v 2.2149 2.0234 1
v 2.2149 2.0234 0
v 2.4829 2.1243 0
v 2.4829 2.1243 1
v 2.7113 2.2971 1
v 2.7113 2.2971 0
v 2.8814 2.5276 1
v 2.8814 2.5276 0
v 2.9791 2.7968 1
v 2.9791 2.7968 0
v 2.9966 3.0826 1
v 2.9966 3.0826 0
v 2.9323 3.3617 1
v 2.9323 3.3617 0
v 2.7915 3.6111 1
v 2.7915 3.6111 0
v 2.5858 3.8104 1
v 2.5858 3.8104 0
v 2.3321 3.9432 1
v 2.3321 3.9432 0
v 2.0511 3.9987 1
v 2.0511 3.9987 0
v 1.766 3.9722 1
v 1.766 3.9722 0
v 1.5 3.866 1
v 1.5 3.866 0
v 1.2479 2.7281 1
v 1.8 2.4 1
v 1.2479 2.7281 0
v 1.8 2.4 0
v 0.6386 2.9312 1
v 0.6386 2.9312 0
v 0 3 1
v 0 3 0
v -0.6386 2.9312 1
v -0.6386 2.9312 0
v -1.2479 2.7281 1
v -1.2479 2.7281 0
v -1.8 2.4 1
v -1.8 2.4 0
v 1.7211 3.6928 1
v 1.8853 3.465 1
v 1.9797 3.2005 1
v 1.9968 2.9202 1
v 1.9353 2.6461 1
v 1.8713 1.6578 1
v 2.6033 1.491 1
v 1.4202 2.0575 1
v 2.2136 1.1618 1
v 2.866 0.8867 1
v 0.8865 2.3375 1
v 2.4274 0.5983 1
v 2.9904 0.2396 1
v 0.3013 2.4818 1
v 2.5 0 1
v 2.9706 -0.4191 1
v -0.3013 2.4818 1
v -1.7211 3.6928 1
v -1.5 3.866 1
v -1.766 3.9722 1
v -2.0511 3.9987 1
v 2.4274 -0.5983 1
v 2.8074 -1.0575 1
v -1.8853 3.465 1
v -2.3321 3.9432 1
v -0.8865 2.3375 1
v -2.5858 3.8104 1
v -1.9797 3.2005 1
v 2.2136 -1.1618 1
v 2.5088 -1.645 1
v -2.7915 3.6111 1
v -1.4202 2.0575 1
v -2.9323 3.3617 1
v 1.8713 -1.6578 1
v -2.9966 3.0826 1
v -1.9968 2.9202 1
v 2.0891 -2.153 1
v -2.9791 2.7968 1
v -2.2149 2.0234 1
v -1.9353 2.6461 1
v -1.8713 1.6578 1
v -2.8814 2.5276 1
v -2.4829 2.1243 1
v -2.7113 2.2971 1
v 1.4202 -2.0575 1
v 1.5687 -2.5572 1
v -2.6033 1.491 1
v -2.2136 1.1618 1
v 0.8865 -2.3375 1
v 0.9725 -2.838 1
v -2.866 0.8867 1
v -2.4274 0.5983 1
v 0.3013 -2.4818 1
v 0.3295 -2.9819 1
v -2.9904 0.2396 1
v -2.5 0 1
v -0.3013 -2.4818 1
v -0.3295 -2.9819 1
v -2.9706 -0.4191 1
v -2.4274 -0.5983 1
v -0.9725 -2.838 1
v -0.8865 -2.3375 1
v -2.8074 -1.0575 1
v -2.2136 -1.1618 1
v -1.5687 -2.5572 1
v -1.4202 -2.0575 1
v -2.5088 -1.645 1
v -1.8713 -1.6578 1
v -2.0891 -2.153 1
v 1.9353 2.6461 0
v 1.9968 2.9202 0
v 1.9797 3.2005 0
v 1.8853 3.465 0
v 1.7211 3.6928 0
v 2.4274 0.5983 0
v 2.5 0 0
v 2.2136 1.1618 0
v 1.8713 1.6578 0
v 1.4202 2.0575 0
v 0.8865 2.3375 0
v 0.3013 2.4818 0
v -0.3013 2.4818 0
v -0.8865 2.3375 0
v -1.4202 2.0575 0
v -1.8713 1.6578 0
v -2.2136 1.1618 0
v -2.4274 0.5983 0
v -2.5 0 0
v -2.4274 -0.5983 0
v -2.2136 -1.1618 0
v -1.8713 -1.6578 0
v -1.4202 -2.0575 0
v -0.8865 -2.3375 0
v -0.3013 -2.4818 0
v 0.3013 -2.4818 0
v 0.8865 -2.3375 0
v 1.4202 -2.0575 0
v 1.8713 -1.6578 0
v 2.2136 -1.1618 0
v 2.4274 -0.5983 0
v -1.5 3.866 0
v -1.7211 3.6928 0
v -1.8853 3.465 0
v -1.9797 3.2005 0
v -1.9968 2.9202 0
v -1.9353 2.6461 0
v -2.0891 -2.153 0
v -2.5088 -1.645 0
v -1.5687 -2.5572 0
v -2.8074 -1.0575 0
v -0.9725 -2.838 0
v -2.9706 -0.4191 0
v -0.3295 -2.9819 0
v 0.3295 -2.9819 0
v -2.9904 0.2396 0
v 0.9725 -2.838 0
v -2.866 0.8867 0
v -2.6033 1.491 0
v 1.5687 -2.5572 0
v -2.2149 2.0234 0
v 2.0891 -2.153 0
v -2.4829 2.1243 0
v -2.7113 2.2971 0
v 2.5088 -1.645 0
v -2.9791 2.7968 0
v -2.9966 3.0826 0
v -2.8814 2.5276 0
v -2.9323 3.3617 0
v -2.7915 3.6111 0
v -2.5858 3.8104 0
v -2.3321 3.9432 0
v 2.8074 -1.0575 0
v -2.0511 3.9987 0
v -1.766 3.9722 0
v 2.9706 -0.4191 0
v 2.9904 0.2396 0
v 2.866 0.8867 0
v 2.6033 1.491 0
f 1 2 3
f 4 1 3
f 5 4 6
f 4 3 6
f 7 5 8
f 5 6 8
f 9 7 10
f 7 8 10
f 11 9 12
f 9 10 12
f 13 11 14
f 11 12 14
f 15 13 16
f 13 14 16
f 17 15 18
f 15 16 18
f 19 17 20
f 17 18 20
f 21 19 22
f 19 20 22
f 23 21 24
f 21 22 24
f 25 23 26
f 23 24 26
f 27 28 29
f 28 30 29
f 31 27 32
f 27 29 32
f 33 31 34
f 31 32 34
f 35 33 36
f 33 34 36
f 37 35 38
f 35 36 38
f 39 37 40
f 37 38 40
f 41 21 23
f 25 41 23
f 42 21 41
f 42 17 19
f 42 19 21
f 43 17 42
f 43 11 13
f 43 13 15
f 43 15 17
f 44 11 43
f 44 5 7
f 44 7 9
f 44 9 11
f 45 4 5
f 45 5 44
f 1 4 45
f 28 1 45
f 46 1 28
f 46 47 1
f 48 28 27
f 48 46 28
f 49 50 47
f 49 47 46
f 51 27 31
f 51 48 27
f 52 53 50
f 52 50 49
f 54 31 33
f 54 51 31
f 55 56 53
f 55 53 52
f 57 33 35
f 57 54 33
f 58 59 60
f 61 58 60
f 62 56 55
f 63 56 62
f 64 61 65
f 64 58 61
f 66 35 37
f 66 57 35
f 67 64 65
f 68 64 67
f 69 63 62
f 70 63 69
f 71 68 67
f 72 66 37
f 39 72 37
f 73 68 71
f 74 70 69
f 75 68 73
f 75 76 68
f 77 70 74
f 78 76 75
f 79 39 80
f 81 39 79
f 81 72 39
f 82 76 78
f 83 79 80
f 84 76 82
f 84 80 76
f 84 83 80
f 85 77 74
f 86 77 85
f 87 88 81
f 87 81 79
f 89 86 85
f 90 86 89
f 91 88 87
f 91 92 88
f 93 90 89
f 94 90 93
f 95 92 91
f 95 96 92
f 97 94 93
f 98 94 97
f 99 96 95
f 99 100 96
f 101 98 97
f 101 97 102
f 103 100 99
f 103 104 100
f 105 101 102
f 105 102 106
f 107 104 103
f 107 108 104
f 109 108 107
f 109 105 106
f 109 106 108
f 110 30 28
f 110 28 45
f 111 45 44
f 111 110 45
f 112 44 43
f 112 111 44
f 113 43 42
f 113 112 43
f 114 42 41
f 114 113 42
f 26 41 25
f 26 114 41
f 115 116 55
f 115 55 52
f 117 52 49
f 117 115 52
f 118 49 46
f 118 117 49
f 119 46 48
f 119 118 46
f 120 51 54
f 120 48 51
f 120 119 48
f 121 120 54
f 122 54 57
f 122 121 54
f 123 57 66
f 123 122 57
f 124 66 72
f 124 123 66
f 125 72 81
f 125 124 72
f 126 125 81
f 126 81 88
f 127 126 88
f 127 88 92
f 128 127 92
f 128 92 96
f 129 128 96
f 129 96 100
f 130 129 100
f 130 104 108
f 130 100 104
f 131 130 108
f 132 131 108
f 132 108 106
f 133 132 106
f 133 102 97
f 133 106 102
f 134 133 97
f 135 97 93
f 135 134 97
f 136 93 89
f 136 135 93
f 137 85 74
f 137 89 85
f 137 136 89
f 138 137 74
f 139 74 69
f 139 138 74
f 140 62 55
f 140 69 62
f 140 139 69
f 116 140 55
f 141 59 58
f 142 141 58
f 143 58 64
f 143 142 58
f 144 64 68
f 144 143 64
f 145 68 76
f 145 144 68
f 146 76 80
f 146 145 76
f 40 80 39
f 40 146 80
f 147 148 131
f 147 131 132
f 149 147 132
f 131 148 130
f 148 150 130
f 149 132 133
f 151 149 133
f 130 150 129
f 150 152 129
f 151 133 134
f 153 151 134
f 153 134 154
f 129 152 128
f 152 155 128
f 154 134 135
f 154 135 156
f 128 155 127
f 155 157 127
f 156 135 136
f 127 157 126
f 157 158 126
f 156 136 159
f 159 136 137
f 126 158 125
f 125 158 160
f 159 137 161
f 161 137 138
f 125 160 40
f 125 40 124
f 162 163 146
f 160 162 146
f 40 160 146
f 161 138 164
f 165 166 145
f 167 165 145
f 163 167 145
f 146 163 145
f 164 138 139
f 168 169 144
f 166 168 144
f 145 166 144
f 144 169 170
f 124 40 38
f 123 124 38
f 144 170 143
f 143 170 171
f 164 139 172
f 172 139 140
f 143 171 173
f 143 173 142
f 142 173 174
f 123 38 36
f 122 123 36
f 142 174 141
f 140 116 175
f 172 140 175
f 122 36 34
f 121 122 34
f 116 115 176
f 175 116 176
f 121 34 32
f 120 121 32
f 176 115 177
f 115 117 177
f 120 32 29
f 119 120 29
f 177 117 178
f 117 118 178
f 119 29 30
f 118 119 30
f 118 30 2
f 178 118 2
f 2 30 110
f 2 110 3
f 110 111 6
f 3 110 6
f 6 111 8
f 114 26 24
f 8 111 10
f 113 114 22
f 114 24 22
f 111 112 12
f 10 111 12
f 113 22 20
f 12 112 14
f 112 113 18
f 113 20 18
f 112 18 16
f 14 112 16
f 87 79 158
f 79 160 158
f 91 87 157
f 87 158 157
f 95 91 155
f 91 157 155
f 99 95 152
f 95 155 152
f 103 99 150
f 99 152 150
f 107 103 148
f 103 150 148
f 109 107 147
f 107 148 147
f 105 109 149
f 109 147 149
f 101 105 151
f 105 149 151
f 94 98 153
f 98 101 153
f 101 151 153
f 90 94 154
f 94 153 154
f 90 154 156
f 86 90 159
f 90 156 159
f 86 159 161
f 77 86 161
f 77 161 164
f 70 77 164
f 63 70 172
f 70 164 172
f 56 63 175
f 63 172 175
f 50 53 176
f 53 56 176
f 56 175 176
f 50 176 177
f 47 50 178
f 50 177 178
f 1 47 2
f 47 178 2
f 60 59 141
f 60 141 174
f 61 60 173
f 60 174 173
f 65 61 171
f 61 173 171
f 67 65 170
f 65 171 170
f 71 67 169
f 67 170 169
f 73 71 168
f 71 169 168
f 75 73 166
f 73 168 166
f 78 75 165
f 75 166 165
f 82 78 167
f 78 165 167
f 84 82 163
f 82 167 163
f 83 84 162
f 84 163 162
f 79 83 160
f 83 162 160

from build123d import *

# Parameters (mm, degrees)
CYLINDER003_R          = 1
CYLINDER003_DEPTH      = 1
CYLINDER002_R          = 1
CYLINDER002_DEPTH      = 1
CYLINDER005_R          = 1
CYLINDER005_DEPTH      = 1
CYLINDER004_R          = 1
CYLINDER004_DEPTH      = 1
CUT002_PLACEMENT_ANGLE = 180
CYLINDER001_R          = 2.5
CYLINDER001_DEPTH      = 5
CYLINDER_R             = 3
CYLINDER_DEPTH         = 1


with BuildPart() as cilindro003:
    # Cylinder003 → Cylinder003 (new body)
    with BuildSketch(Plane(origin=(-7, 0, 0), x_dir=(1, 0, 0), z_dir=(0, 0, 1))):
        Circle(CYLINDER003_R)
    extrude(amount=CYLINDER003_DEPTH)


with BuildPart() as cut001:
    # Cylinder002 → Cylinder002 (new body)
    with BuildSketch(Plane(origin=(-8, 0, 0), x_dir=(1, 0, 0), z_dir=(0, 0, 1))):
        Circle(CYLINDER002_R)
    extrude(amount=CYLINDER002_DEPTH)

    # Cut001: cut Cilindro003
    add(cilindro003.part, mode=Mode.SUBTRACT)


with BuildPart() as cut001_1:
    # Cut001 placement: moved
    add(cut001.part.moved(Location((6, 3, 0))))


with BuildPart() as cilindro005:
    # Cylinder005 → Cylinder005 (new body)
    with BuildSketch(Plane(origin=(-7, 0, 0), x_dir=(1, 0, 0), z_dir=(0, 0, 1))):
        Circle(CYLINDER005_R)
    extrude(amount=CYLINDER005_DEPTH)


with BuildPart() as cut002:
    # Cylinder004 → Cylinder004 (new body)
    with BuildSketch(Plane(origin=(-8, 0, 0), x_dir=(1, 0, 0), z_dir=(0, 0, 1))):
        Circle(CYLINDER004_R)
    extrude(amount=CYLINDER004_DEPTH)

    # Cut002: cut Cilindro005
    add(cilindro005.part, mode=Mode.SUBTRACT)


with BuildPart() as cut002_1:
    # Cut002 placement: moved
    add(cut002.part.moved(Location((-6, 3, 0))).rotate(Axis((-6, 3, 0), (0, 0, 1)), CUT002_PLACEMENT_ANGLE))


with BuildPart() as cilindro001:
    # Cylinder001 → Cylinder001 (new body)
    with BuildSketch(Plane.XY.offset(-2)):
        Circle(CYLINDER001_R)
    extrude(amount=CYLINDER001_DEPTH)


with BuildPart() as fusion:
    # Cylinder → Cylinder (new body)
    with BuildSketch(Plane.XY):
        Circle(CYLINDER_R)
    extrude(amount=CYLINDER_DEPTH)

    # Cut: cut Cilindro001
    add(cilindro001.part, mode=Mode.SUBTRACT)

    # Fusion: union Cut001, Cut002
    add(cut001_1.part)
    add(cut002_1.part)


solid = fusion.part
